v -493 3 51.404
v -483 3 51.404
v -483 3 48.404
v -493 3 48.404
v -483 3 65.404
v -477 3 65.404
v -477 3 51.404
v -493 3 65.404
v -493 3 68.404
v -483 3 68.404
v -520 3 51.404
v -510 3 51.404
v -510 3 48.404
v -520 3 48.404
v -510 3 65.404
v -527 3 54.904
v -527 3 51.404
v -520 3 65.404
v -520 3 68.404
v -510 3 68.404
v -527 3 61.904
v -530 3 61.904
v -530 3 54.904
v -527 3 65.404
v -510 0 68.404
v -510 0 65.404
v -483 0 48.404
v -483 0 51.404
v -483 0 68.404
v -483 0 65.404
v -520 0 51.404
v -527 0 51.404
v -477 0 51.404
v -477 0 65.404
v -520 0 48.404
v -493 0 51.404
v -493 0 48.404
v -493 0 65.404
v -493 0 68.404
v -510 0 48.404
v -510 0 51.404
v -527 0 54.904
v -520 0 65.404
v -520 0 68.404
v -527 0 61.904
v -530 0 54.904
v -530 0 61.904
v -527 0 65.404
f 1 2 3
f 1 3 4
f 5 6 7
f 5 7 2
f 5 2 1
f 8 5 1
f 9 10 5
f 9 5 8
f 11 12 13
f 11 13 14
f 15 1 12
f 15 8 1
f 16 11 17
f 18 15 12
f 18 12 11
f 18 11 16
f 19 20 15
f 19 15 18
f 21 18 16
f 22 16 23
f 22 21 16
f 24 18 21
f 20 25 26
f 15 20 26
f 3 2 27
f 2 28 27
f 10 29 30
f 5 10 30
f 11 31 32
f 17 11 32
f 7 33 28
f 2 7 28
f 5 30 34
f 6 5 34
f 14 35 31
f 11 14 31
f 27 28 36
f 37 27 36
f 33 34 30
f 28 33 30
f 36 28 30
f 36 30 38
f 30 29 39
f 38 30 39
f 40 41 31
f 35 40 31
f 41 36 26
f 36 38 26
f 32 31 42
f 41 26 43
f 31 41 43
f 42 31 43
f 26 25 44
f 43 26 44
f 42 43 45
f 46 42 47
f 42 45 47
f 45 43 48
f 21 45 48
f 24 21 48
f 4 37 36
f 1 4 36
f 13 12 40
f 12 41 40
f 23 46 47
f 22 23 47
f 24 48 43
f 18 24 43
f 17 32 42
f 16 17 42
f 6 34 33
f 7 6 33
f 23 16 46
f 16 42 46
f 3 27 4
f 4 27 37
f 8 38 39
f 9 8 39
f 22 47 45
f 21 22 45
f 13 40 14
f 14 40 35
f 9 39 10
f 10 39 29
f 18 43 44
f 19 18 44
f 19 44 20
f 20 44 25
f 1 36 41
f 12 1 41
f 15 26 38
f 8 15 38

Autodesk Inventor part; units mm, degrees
ref_plane "YZ Plane" through (0, 0, 0) normal (1, 0, 0) x (0, 1, 0)
ref_plane "XZ Plane" through (0, 0, 0) normal (0, 1, 0) x (-1, 0, 0)
ref_plane "XY Plane" through (0, 0, 0) normal (0, 0, 1) x (1, 0, 0)
sketch "Sketch2" plane through (0, 0, 0) normal (0, 1, 0) x (-1, 0, 0)
  line L0 (600, 68.7059) -> (634, 68.7059)
  arc A0 (642, 60.7059) -> (634, 68.7059) centre (634, 60.7059) ccw
  line L1 (642, 60.7059) -> (642, 56.7059)
  arc A1 (634, 48.7059) -> (642, 56.7059) centre (634, 56.7059) ccw
  line L2 (634, 48.7059) -> (632, 48.7059)
  arc A2 (632, 48.7059) -> (624, 40.7059) centre (632, 40.7059) ccw
  line L3 (624, 40.7059) -> (624, 36.7059)
  arc A3 (624, 36.7059) -> (632, 28.7059) centre (632, 36.7059) ccw
  line L4 (632, 28.7059) -> (634, 28.7059)
  arc A4 (642, 20.7059) -> (634, 28.7059) centre (634, 20.7059) ccw
  line L5 (642, 20.7059) -> (642, 16.7059)
  arc A5 (634, 8.7059) -> (642, 16.7059) centre (634, 16.7059) ccw
  line L6 (634, 8.7059) -> (600, 8.7059)
  arc A6 (592, 16.7059) -> (600, 8.7059) centre (600, 16.7059) ccw
  line L7 (592, 16.7059) -> (592, 21.7059)
  line L8 (592, 21.7059) -> (606.1716, 35.8774)
  arc A7 (606.1716, 35.8774) -> (606.1716, 41.5343) centre (603.3431, 38.7059) ccw
  line L9 (606.1716, -97.5343) -> (592, -111.7059)
  line L10 (592, -111.7059) -> (592, -116.7059)
  arc A8 (592, -116.7059) -> (600, -124.7059) centre (600, -116.7059) ccw
  line L11 (600, -124.7059) -> (634, -124.7059)
  arc A9 (634, -124.7059) -> (642, -116.7059) centre (634, -116.7059) ccw
  line L12 (642, -116.7059) -> (642, -112.7059)
  arc A10 (642, -112.7059) -> (634, -104.7059) centre (634, -112.7059) ccw
  line L13 (634, -104.7059) -> (632, -104.7059)
  arc A11 (624, -96.7059) -> (632, -104.7059) centre (632, -96.7059) ccw
  line L14 (624, -96.7059) -> (624, -92.7059)
  arc A12 (632, -84.7059) -> (624, -92.7059) centre (632, -92.7059) ccw
  line L15 (632, -84.7059) -> (634, -84.7059)
  arc A13 (634, -84.7059) -> (642, -76.7059) centre (634, -76.7059) ccw
  line L16 (642, -76.7059) -> (642, -72.7059)
  arc A14 (642, -72.7059) -> (634, -64.7059) centre (634, -72.7059) ccw
  line L17 (634, -64.7059) -> (600, -64.7059)
  arc A15 (600, -64.7059) -> (592, -72.7059) centre (600, -72.7059) ccw
  line L18 (592, -72.7059) -> (592, -77.7059)
  line L19 (592, -77.7059) -> (606.1716, -91.8774)
  arc A16 (606.1716, -97.5343) -> (606.1716, -91.8774) centre (603.3431, -94.7059) ccw
  circle A17 centre (618, -74.7059) radius 3
  circle A18 centre (634, -74.7059) radius 3
  circle A19 centre (634, -114.7059) radius 3
  circle A20 centre (618, -114.7059) radius 3
  circle A21 centre (618, 58.7059) radius 3
  circle A22 centre (634, 58.7059) radius 3
  circle A23 centre (634, 18.7059) radius 3
  circle A24 centre (618, 18.7059) radius 3
  line L20 (606.1716, 41.5343) -> (592, 55.7059)
  line L21 (592, 55.7059) -> (592, 60.7059)
  arc A25 (600, 68.7059) -> (592, 60.7059) centre (600, 60.7059) ccw
  line L22 (329, -137) -> (729, -137)
  line L23 (729, -137) -> (729, 83)
  line L24 (729, 83) -> (329, 83)
  line L25 (329, 83) -> (329, -137)
  line L26 (444, -107.4043) -> (417.5, -107.4043)
  line L27 (417.5, -107.4043) -> (417.5, -104.4043)
  line L28 (417.5, -104.4043) -> (450, -104.4043)
  line L29 (450, -104.4043) -> (450, -107.4043)
  line L30 (450, -107.4043) -> (444, -107.4043)
  line L31 (441, -117.9043) -> (444, -117.9043)
  line L32 (444, -117.9043) -> (444, -110.9043)
  line L33 (444, -110.9043) -> (441, -110.9043)
  line L34 (441, -110.9043) -> (441, -117.9043)
  line L35 (417.5, -121.4043) -> (417.5, -124.4043)
  line L36 (417.5, -124.4043) -> (450, -124.4043)
  line L37 (450, -124.4043) -> (450, -121.4043)
  line L38 (450, -121.4043) -> (417.5, -121.4043)
  line L39 (376.0002, -107.4043) -> (402.5, -107.4043)
  line L40 (402.5, -107.4043) -> (402.5, -104.4043)
  line L41 (402.5, -104.4043) -> (370, -104.4043)
  line L42 (370, -104.4043) -> (370, -107.4043)
  line L43 (370, -107.4043) -> (376.0002, -107.4043)
  line L44 (379.0002, -121.4043) -> (370, -121.4043)
  line L45 (370, -121.4043) -> (370, -124.4043)
  line L46 (370, -124.4043) -> (402.5, -124.4043)
  line L47 (402.5, -124.4043) -> (402.5, -121.4043)
  line L48 (402.5, -121.4043) -> (379.0002, -121.4043)
  line L49 (379.0002, -117.9043) -> (376.0002, -117.9043)
  line L50 (376.0002, -117.9043) -> (376.0002, -110.9043)
  line L51 (376.0002, -110.9043) -> (379.0002, -110.9043)
  line L52 (379.0002, -110.9043) -> (379.0002, -117.9043)
  line L53 (348, -127) -> (472.0002, -127)
  line L54 (472.0002, -127) -> (472.0002, -124.4043)
  line L55 (472.0002, -124.4043) -> (465, -124.4043)
  line L56 (465, -124.4043) -> (465, -121.4043)
  line L57 (465, -121.4043) -> (472.0002, -121.4043)
  line L58 (472.0002, -121.4043) -> (472.0002, -107.4043)
  line L59 (472.0002, -107.4043) -> (465, -107.4043)
  line L60 (465, -107.4043) -> (465, -104.4043)
  line L61 (465, -104.4043) -> (472.0002, -104.4043)
  line L62 (472.0002, -104.4043) -> (472.0002, -101)
  line L63 (472.0002, -101) -> (348, -101)
  line L64 (348, -101) -> (348, -104.4043)
  line L65 (348, -104.4043) -> (355, -104.4043)
  line L66 (355, -104.4043) -> (355, -107.4043)
  line L67 (355, -107.4043) -> (348, -107.4043)
  line L68 (348, -107.4043) -> (348, -121.4043)
  line L69 (348, -121.4043) -> (355, -121.4043)
  line L70 (355, -121.4043) -> (355, -124.4043)
  line L71 (355, -124.4043) -> (348, -124.4043)
  line L72 (348, -124.4043) -> (348, -127)
  circle A26 centre (447.7252, -37.7011) radius 3
  circle A27 centre (372.2748, -37.7011) radius 3
  circle A28 centre (410, -64.4043) radius 3
  circle A29 centre (448.5, -66.4043) radius 3
  circle A30 centre (371.5, -66.4043) radius 3
  circle A31 centre (410, -80.4043) radius 3
  line L73 (379, -84.4043) -> (376, -84.4043)
  line L74 (376, -84.4043) -> (376, -74.4043)
  line L75 (376, -74.4043) -> (379, -74.4043)
  line L76 (379, -74.4043) -> (379, -84.4043)
  line L77 (379, -57.4043) -> (376, -57.4043)
  line L78 (376, -57.4043) -> (376, -47.4043)
  line L79 (376, -47.4043) -> (379, -47.4043)
  line L80 (379, -47.4043) -> (379, -57.4043)
  line L81 (441, -47.4043) -> (441, -57.4043)
  line L82 (441, -57.4043) -> (444, -57.4043)
  line L83 (444, -57.4043) -> (444, -47.4043)
  line L84 (444, -47.4043) -> (441, -47.4043)
  line L85 (441, -74.4043) -> (441, -84.4043)
  line L86 (441, -84.4043) -> (444, -84.4043)
  line L87 (444, -84.4043) -> (444, -74.4043)
  line L88 (444, -74.4043) -> (441, -74.4043)
  line L89 (427, -44.4043) -> (427, -72.4043)
  arc A32 (427, -72.4043) -> (433, -72.4043) centre (430, -72.4043) ccw
  line L90 (433, -72.4043) -> (433, -44.4043)
  arc A33 (433, -44.4043) -> (427, -44.4043) centre (430, -44.4043) ccw
  arc A34 (387, -72.4043) -> (393, -72.4043) centre (390, -72.4043) ccw
  line L91 (393, -72.4043) -> (393, -44.4043)
  arc A35 (393, -44.4043) -> (387, -44.4043) centre (390, -44.4043) ccw
  line L92 (387, -44.4043) -> (387, -72.4043)
  line L93 (372.3983, -27.7019) -> (383.2576, -27.7018)
  arc A36 (390.8984, -33.3311) -> (383.2576, -27.7018) centre (383.2577, -35.7018) ccw
  arc A37 (390.8984, -33.3311) -> (429.1018, -33.3307) centre (410, -27.4043) ccw
  arc A38 (436.7424, -27.7012) -> (429.1018, -33.3307) centre (436.7425, -35.7012) ccw
  line L94 (436.7424, -27.7012) -> (447.7251, -27.7011)
  arc A39 (457.0715, -34.1449) -> (447.7251, -27.7011) centre (447.7252, -37.7011) ccw
  line L95 (457.0715, -34.1449) -> (477.9368, -88.9818)
  arc A40 (474.1982, -94.4043) -> (477.9368, -88.9818) centre (474.1982, -90.4043) ccw
  line L96 (474.1982, -94.4043) -> (465, -94.4043)
  line L97 (465, -94.4043) -> (465, -91.4043)
  line L98 (465, -91.4043) -> (450, -91.4043)
  line L99 (450, -91.4043) -> (450, -94.4043)
  line L100 (450, -94.4043) -> (417.5, -94.4043)
  line L101 (417.5, -94.4043) -> (417.5, -91.4043)
  line L102 (417.5, -91.4043) -> (402.5, -91.4043)
  line L103 (402.5, -91.4043) -> (402.5, -94.4043)
  line L104 (402.5, -94.4043) -> (370, -94.4043)
  line L105 (370, -94.4043) -> (370, -91.4043)
  line L106 (370, -91.4043) -> (355, -91.4043)
  line L107 (355, -91.4043) -> (355, -94.4043)
  line L108 (355, -94.4043) -> (345.8018, -94.4043)
  arc A41 (342.0632, -88.9818) -> (345.8018, -94.4043) centre (345.8018, -90.4043) ccw
  line L109 (342.0632, -88.9818) -> (362.9285, -34.1449)
  arc A42 (372.3983, -27.7019) -> (362.9285, -34.1449) centre (372.2748, -37.7011) ccw
  line L110 (491.3983, -95.7004) -> (502.2576, -95.7005)
  arc A43 (502.2576, -95.7005) -> (509.8984, -90.0712) centre (502.2577, -87.7005) ccw
  arc A44 (548.1018, -90.0716) -> (509.8984, -90.0712) centre (529, -95.998) ccw
  arc A45 (548.1018, -90.0716) -> (555.7424, -95.701) centre (555.7425, -87.701) ccw
  line L111 (555.7424, -95.701) -> (566.7251, -95.7011)
  arc A46 (566.7251, -95.7011) -> (576.0715, -89.2574) centre (566.7252, -85.7011) ccw
  line L112 (576.0715, -89.2574) -> (596.9368, -34.4205)
  arc A47 (596.9368, -34.4205) -> (593.1982, -28.998) centre (593.1982, -32.998) ccw
  line L113 (593.1982, -28.998) -> (584, -28.998)
  line L114 (584, -28.998) -> (584, -31.998)
  line L115 (584, -31.998) -> (569, -31.998)
  line L116 (569, -31.998) -> (569, -28.998)
  line L117 (569, -28.998) -> (536.5, -28.998)
  line L118 (536.5, -28.998) -> (536.5, -31.998)
  line L119 (536.5, -31.998) -> (521.5, -31.998)
  line L120 (521.5, -31.998) -> (521.5, -28.998)
  line L121 (521.5, -28.998) -> (489, -28.998)
  line L122 (489, -28.998) -> (489, -31.998)
  line L123 (489, -31.998) -> (474, -31.998)
  line L124 (474, -31.998) -> (474, -28.998)
  line L125 (474, -28.998) -> (464.8018, -28.998)
  arc A48 (464.8018, -28.998) -> (461.0632, -34.4205) centre (464.8018, -32.998) ccw
  line L126 (461.0632, -34.4205) -> (481.9285, -89.2574)
  arc A49 (481.9285, -89.2574) -> (491.3983, -95.7004) centre (491.2748, -85.7011) ccw
  arc A50 (512, -50.998) -> (506, -50.998) centre (509, -50.998) ccw
  line L127 (512, -50.998) -> (512, -78.998)
  arc A51 (506, -78.998) -> (512, -78.998) centre (509, -78.998) ccw
  line L128 (506, -78.998) -> (506, -50.998)
  line L129 (546, -78.998) -> (546, -50.998)
  arc A52 (552, -50.998) -> (546, -50.998) centre (549, -50.998) ccw
  line L130 (552, -50.998) -> (552, -78.998)
  arc A53 (546, -78.998) -> (552, -78.998) centre (549, -78.998) ccw
  line L131 (560, -48.998) -> (560, -38.998)
  line L132 (560, -38.998) -> (563, -38.998)
  line L133 (563, -38.998) -> (563, -48.998)
  line L134 (563, -48.998) -> (560, -48.998)
  line L135 (560, -75.998) -> (560, -65.998)
  line L136 (560, -65.998) -> (563, -65.998)
  line L137 (563, -65.998) -> (563, -75.998)
  line L138 (563, -75.998) -> (560, -75.998)
  line L139 (498, -65.998) -> (495, -65.998)
  line L140 (495, -65.998) -> (495, -75.998)
  line L141 (495, -75.998) -> (498, -75.998)
  line L142 (498, -75.998) -> (498, -65.998)
  line L143 (498, -38.998) -> (495, -38.998)
  line L144 (495, -38.998) -> (495, -48.998)
  line L145 (495, -48.998) -> (498, -48.998)
  line L146 (498, -48.998) -> (498, -38.998)
  circle A54 centre (529, -42.998) radius 3
  circle A55 centre (490.5, -56.998) radius 3
  circle A56 centre (567.5, -56.998) radius 3
  circle A57 centre (529, -58.998) radius 3
  circle A58 centre (491.2748, -85.7011) radius 3
  circle A59 centre (566.7252, -85.7011) radius 3
  circle A60 centre (462, -114.4043) radius 3
  circle A61 centre (358.0002, -114.4043) radius 3
  line L147 (578, -104.4043) -> (578, -107.4043)
  line L148 (578, -107.4043) -> (585, -107.4043)
  line L149 (585, -107.4043) -> (585, -110.9043)
  line L150 (585, -110.9043) -> (588, -110.9043)
  line L151 (588, -110.9043) -> (588, -117.9043)
  line L152 (588, -117.9043) -> (585, -117.9043)
  line L153 (585, -117.9043) -> (585, -121.4043)
  line L154 (585, -121.4043) -> (578, -121.4043)
  line L155 (578, -121.4043) -> (578, -124.4043)
  line L156 (578, -124.4043) -> (568, -124.4043)
  line L157 (568, -124.4043) -> (568, -121.4043)
  line L158 (568, -121.4043) -> (551, -121.4043)
  line L159 (551, -121.4043) -> (551, -124.4043)
  line L160 (551, -124.4043) -> (541, -124.4043)
  line L161 (541, -124.4043) -> (541, -121.4043)
  line L162 (541, -121.4043) -> (535, -121.4043)
  line L163 (535, -121.4043) -> (535, -107.4043)
  line L164 (535, -107.4043) -> (541, -107.4043)
  line L165 (541, -107.4043) -> (541, -104.4043)
  line L166 (541, -104.4043) -> (551, -104.4043)
  line L167 (551, -104.4043) -> (551, -107.4043)
  line L168 (551, -107.4043) -> (568, -107.4043)
  line L169 (568, -107.4043) -> (568, -104.4043)
  line L170 (568, -104.4043) -> (578, -104.4043)
  line L171 (520, -104.4043) -> (520, -107.4043)
  line L172 (520, -107.4043) -> (527, -107.4043)
  line L173 (527, -107.4043) -> (527, -110.9043)
  line L174 (527, -110.9043) -> (530, -110.9043)
  line L175 (530, -110.9043) -> (530, -117.9043)
  line L176 (530, -117.9043) -> (527, -117.9043)
  line L177 (527, -117.9043) -> (527, -121.4043)
  line L178 (527, -121.4043) -> (520, -121.4043)
  line L179 (520, -121.4043) -> (520, -124.4043)
  line L180 (520, -124.4043) -> (510, -124.4043)
  line L181 (510, -124.4043) -> (510, -121.4043)
  line L182 (510, -121.4043) -> (493, -121.4043)
  line L183 (493, -121.4043) -> (493, -124.4043)
  line L184 (493, -124.4043) -> (483, -124.4043)
  line L185 (483, -124.4043) -> (483, -121.4043)
  line L186 (483, -121.4043) -> (477, -121.4043)
  line L187 (477, -121.4043) -> (477, -107.4043)
  line L188 (477, -107.4043) -> (483, -107.4043)
  line L189 (483, -107.4043) -> (483, -104.4043)
  line L190 (483, -104.4043) -> (493, -104.4043)
  line L191 (493, -104.4043) -> (493, -107.4043)
  line L192 (493, -107.4043) -> (510, -107.4043)
  line L193 (510, -107.4043) -> (510, -104.4043)
  line L194 (510, -104.4043) -> (520, -104.4043)
  line L195 (520, 48.4043) -> (520, 51.4043)
  line L196 (520, 51.4043) -> (527, 51.4043)
  line L197 (527, 51.4043) -> (527, 54.9043)
  line L198 (527, 54.9043) -> (530, 54.9043)
  line L199 (530, 54.9043) -> (530, 61.9043)
  line L200 (530, 61.9043) -> (527, 61.9043)
  line L201 (527, 61.9043) -> (527, 65.4043)
  line L202 (527, 65.4043) -> (520, 65.4043)
  line L203 (520, 65.4043) -> (520, 68.4043)
  line L204 (520, 68.4043) -> (510, 68.4043)
  line L205 (510, 68.4043) -> (510, 65.4043)
  line L206 (510, 65.4043) -> (493, 65.4043)
  line L207 (493, 65.4043) -> (493, 68.4043)
  line L208 (493, 68.4043) -> (483, 68.4043)
  line L209 (483, 68.4043) -> (483, 65.4043)
  line L210 (483, 65.4043) -> (477, 65.4043)
  line L211 (477, 65.4043) -> (477, 51.4043)
  line L212 (477, 51.4043) -> (483, 51.4043)
  line L213 (483, 51.4043) -> (483, 48.4043)
  line L214 (483, 48.4043) -> (493, 48.4043)
  line L215 (493, 48.4043) -> (493, 51.4043)
  line L216 (493, 51.4043) -> (510, 51.4043)
  line L217 (510, 51.4043) -> (510, 48.4043)
  line L218 (510, 48.4043) -> (520, 48.4043)
  line L219 (578, 48.4043) -> (578, 51.4043)
  line L220 (578, 51.4043) -> (585, 51.4043)
  line L221 (585, 51.4043) -> (585, 54.9043)
  line L222 (585, 54.9043) -> (588, 54.9043)
  line L223 (588, 54.9043) -> (588, 61.9043)
  line L224 (588, 61.9043) -> (585, 61.9043)
  line L225 (585, 61.9043) -> (585, 65.4043)
  line L226 (585, 65.4043) -> (578, 65.4043)
  line L227 (578, 65.4043) -> (578, 68.4043)
  line L228 (578, 68.4043) -> (568, 68.4043)
  line L229 (568, 68.4043) -> (568, 65.4043)
  line L230 (568, 65.4043) -> (551, 65.4043)
  line L231 (551, 65.4043) -> (551, 68.4043)
  line L232 (551, 68.4043) -> (541, 68.4043)
  line L233 (541, 68.4043) -> (541, 65.4043)
  line L234 (541, 65.4043) -> (535, 65.4043)
  line L235 (535, 65.4043) -> (535, 51.4043)
  line L236 (535, 51.4043) -> (541, 51.4043)
  line L237 (541, 51.4043) -> (541, 48.4043)
  line L238 (541, 48.4043) -> (551, 48.4043)
  line L239 (551, 48.4043) -> (551, 51.4043)
  line L240 (551, 51.4043) -> (568, 51.4043)
  line L241 (568, 51.4043) -> (568, 48.4043)
  line L242 (568, 48.4043) -> (578, 48.4043)
  circle A62 centre (358.0002, 58.4043) radius 3
  circle A63 centre (462, 58.4043) radius 3
  circle A64 centre (566.7252, 29.7011) radius 3
  circle A65 centre (491.2748, 29.7011) radius 3
  circle A66 centre (529, 2.998) radius 3
  circle A67 centre (567.5, 0.998) radius 3
  circle A68 centre (490.5, 0.998) radius 3
  circle A69 centre (529, -13.002) radius 3
  line L243 (498, -17.002) -> (495, -17.002)
  line L244 (495, -17.002) -> (495, -7.002)
  line L245 (495, -7.002) -> (498, -7.002)
  line L246 (498, -7.002) -> (498, -17.002)
  line L247 (498, 9.998) -> (495, 9.998)
  line L248 (495, 9.998) -> (495, 19.998)
  line L249 (495, 19.998) -> (498, 19.998)
  line L250 (498, 19.998) -> (498, 9.998)
  line L251 (560, 19.998) -> (560, 9.998)
  line L252 (560, 9.998) -> (563, 9.998)
  line L253 (563, 9.998) -> (563, 19.998)
  line L254 (563, 19.998) -> (560, 19.998)
  line L255 (560, -7.002) -> (560, -17.002)
  line L256 (560, -17.002) -> (563, -17.002)
  line L257 (563, -17.002) -> (563, -7.002)
  line L258 (563, -7.002) -> (560, -7.002)
  line L259 (546, 22.998) -> (546, -5.002)
  arc A70 (546, -5.002) -> (552, -5.002) centre (549, -5.002) ccw
  line L260 (552, -5.002) -> (552, 22.998)
  arc A71 (552, 22.998) -> (546, 22.998) centre (549, 22.998) ccw
  arc A72 (506, -5.002) -> (512, -5.002) centre (509, -5.002) ccw
  line L261 (512, -5.002) -> (512, 22.998)
  arc A73 (512, 22.998) -> (506, 22.998) centre (509, 22.998) ccw
  line L262 (506, 22.998) -> (506, -5.002)
  line L263 (491.3983, 39.7004) -> (502.2576, 39.7005)
  arc A74 (509.8984, 34.0712) -> (502.2576, 39.7005) centre (502.2577, 31.7005) ccw
  arc A75 (509.8984, 34.0712) -> (548.1018, 34.0716) centre (529, 39.998) ccw
  arc A76 (555.7424, 39.701) -> (548.1018, 34.0716) centre (555.7425, 31.701) ccw
  line L264 (555.7424, 39.701) -> (566.7251, 39.7011)
  arc A77 (576.0715, 33.2574) -> (566.7251, 39.7011) centre (566.7252, 29.7011) ccw
  line L265 (576.0715, 33.2574) -> (596.9368, -21.5795)
  arc A78 (593.1982, -27.002) -> (596.9368, -21.5795) centre (593.1982, -23.002) ccw
  line L266 (593.1982, -27.002) -> (584, -27.002)
  line L267 (584, -27.002) -> (584, -24.002)
  line L268 (584, -24.002) -> (569, -24.002)
  line L269 (569, -24.002) -> (569, -27.002)
  line L270 (569, -27.002) -> (536.5, -27.002)
  line L271 (536.5, -27.002) -> (536.5, -24.002)
  line L272 (536.5, -24.002) -> (521.5, -24.002)
  line L273 (521.5, -24.002) -> (521.5, -27.002)
  line L274 (521.5, -27.002) -> (489, -27.002)
  line L275 (489, -27.002) -> (489, -24.002)
  line L276 (489, -24.002) -> (474, -24.002)
  line L277 (474, -24.002) -> (474, -27.002)
  line L278 (474, -27.002) -> (464.8018, -27.002)
  arc A79 (461.0632, -21.5795) -> (464.8018, -27.002) centre (464.8018, -23.002) ccw
  line L279 (461.0632, -21.5795) -> (481.9285, 33.2574)
  arc A80 (491.3983, 39.7004) -> (481.9285, 33.2574) centre (491.2748, 29.7011) ccw
  line L280 (372.3983, -28.2981) -> (383.2576, -28.2982)
  arc A81 (383.2576, -28.2982) -> (390.8984, -22.6689) centre (383.2577, -20.2982) ccw
  arc A82 (429.1018, -22.6693) -> (390.8984, -22.6689) centre (410, -28.5957) ccw
  arc A83 (429.1018, -22.6693) -> (436.7424, -28.2988) centre (436.7425, -20.2988) ccw
  line L281 (436.7424, -28.2988) -> (447.7251, -28.2989)
  arc A84 (447.7251, -28.2989) -> (457.0715, -21.8551) centre (447.7252, -18.2989) ccw
  line L282 (457.0715, -21.8551) -> (477.9368, 32.9818)
  arc A85 (477.9368, 32.9818) -> (474.1982, 38.4043) centre (474.1982, 34.4043) ccw
  line L283 (474.1982, 38.4043) -> (465, 38.4043)
  line L284 (465, 38.4043) -> (465, 35.4043)
  line L285 (465, 35.4043) -> (450, 35.4043)
  line L286 (450, 35.4043) -> (450, 38.4043)
  line L287 (450, 38.4043) -> (417.5, 38.4043)
  line L288 (417.5, 38.4043) -> (417.5, 35.4043)
  line L289 (417.5, 35.4043) -> (402.5, 35.4043)
  line L290 (402.5, 35.4043) -> (402.5, 38.4043)
  line L291 (402.5, 38.4043) -> (370, 38.4043)
  line L292 (370, 38.4043) -> (370, 35.4043)
  line L293 (370, 35.4043) -> (355, 35.4043)
  line L294 (355, 35.4043) -> (355, 38.4043)
  line L295 (355, 38.4043) -> (345.8018, 38.4043)
  arc A86 (345.8018, 38.4043) -> (342.0632, 32.9818) centre (345.8018, 34.4043) ccw
  line L296 (342.0632, 32.9818) -> (362.9285, -21.8551)
  arc A87 (362.9285, -21.8551) -> (372.3983, -28.2981) centre (372.2748, -18.2989) ccw
  arc A88 (393, 16.4043) -> (387, 16.4043) centre (390, 16.4043) ccw
  line L297 (393, 16.4043) -> (393, -11.5957)
  arc A89 (387, -11.5957) -> (393, -11.5957) centre (390, -11.5957) ccw
  line L298 (387, -11.5957) -> (387, 16.4043)
  line L299 (427, -11.5957) -> (427, 16.4043)
  arc A90 (433, 16.4043) -> (427, 16.4043) centre (430, 16.4043) ccw
  line L300 (433, 16.4043) -> (433, -11.5957)
  arc A91 (427, -11.5957) -> (433, -11.5957) centre (430, -11.5957) ccw
  line L301 (441, 18.4043) -> (441, 28.4043)
  line L302 (441, 28.4043) -> (444, 28.4043)
  line L303 (444, 28.4043) -> (444, 18.4043)
  line L304 (444, 18.4043) -> (441, 18.4043)
  line L305 (441, -8.5957) -> (441, 1.4043)
  line L306 (441, 1.4043) -> (444, 1.4043)
  line L307 (444, 1.4043) -> (444, -8.5957)
  line L308 (444, -8.5957) -> (441, -8.5957)
  line L309 (379, 1.4043) -> (376, 1.4043)
  line L310 (376, 1.4043) -> (376, -8.5957)
  line L311 (376, -8.5957) -> (379, -8.5957)
  line L312 (379, -8.5957) -> (379, 1.4043)
  line L313 (379, 28.4043) -> (376, 28.4043)
  line L314 (376, 28.4043) -> (376, 18.4043)
  line L315 (376, 18.4043) -> (379, 18.4043)
  line L316 (379, 18.4043) -> (379, 28.4043)
  circle A92 centre (410, 24.4043) radius 3
  circle A93 centre (371.5, 10.4043) radius 3
  circle A94 centre (448.5, 10.4043) radius 3
  circle A95 centre (410, 8.4043) radius 3
  circle A96 centre (372.2748, -18.2989) radius 3
  circle A97 centre (447.7252, -18.2989) radius 3
  line L317 (348, 71) -> (472.0002, 71)
  line L318 (472.0002, 71) -> (472.0002, 68.4043)
  line L319 (472.0002, 68.4043) -> (465, 68.4043)
  line L320 (465, 68.4043) -> (465, 65.4043)
  line L321 (465, 65.4043) -> (472.0002, 65.4043)
  line L322 (472.0002, 65.4043) -> (472.0002, 51.4043)
  line L323 (472.0002, 51.4043) -> (465, 51.4043)
  line L324 (465, 51.4043) -> (465, 48.4043)
  line L325 (465, 48.4043) -> (472.0002, 48.4043)
  line L326 (472.0002, 48.4043) -> (472.0002, 45)
  line L327 (472.0002, 45) -> (348, 45)
  line L328 (348, 45) -> (348, 48.4043)
  line L329 (348, 48.4043) -> (355, 48.4043)
  line L330 (355, 48.4043) -> (355, 51.4043)
  line L331 (355, 51.4043) -> (348, 51.4043)
  line L332 (348, 51.4043) -> (348, 65.4043)
  line L333 (348, 65.4043) -> (355, 65.4043)
  line L334 (355, 65.4043) -> (355, 68.4043)
  line L335 (355, 68.4043) -> (348, 68.4043)
  line L336 (348, 68.4043) -> (348, 71)
  line L337 (379.0002, 61.9043) -> (376.0002, 61.9043)
  line L338 (376.0002, 61.9043) -> (376.0002, 54.9043)
  line L339 (376.0002, 54.9043) -> (379.0002, 54.9043)
  line L340 (379.0002, 54.9043) -> (379.0002, 61.9043)
  line L341 (379.0002, 65.4043) -> (370, 65.4043)
  line L342 (370, 65.4043) -> (370, 68.4043)
  line L343 (370, 68.4043) -> (402.5, 68.4043)
  line L344 (402.5, 68.4043) -> (402.5, 65.4043)
  line L345 (402.5, 65.4043) -> (379.0002, 65.4043)
  line L346 (376.0002, 51.4043) -> (402.5, 51.4043)
  line L347 (402.5, 51.4043) -> (402.5, 48.4043)
  line L348 (402.5, 48.4043) -> (370, 48.4043)
  line L349 (370, 48.4043) -> (370, 51.4043)
  line L350 (370, 51.4043) -> (376.0002, 51.4043)
  line L351 (417.5, 65.4043) -> (417.5, 68.4043)
  line L352 (417.5, 68.4043) -> (450, 68.4043)
  line L353 (450, 68.4043) -> (450, 65.4043)
  line L354 (450, 65.4043) -> (417.5, 65.4043)
  line L355 (441, 61.9043) -> (444, 61.9043)
  line L356 (444, 61.9043) -> (444, 54.9043)
  line L357 (444, 54.9043) -> (441, 54.9043)
  line L358 (441, 54.9043) -> (441, 61.9043)
  line L359 (444, 51.4043) -> (417.5, 51.4043)
  line L360 (417.5, 51.4043) -> (417.5, 48.4043)
  line L361 (417.5, 48.4043) -> (450, 48.4043)
  line L362 (450, 48.4043) -> (450, 51.4043)
  line L363 (450, 51.4043) -> (444, 51.4043)
  line L364 (672, -101.5) -> (672, -103)
  line L365 (672, -103) -> (695, -103)
  line L366 (695, -103) -> (695, -107.1363)
  arc A98 (692.2891, -110.9229) -> (695, -107.1363) centre (691, -107.1363) ccw
  line L367 (692.2891, -110.9229) -> (650.6445, -125.0997)
  arc A99 (648, -123.2064) -> (650.6445, -125.0997) centre (650, -123.2064) ccw
  line L368 (648, -123.2064) -> (648, -115)
  line L369 (648, -115) -> (649, -115)
  arc A100 (649, -115) -> (651, -113) centre (649, -113) ccw
  line L370 (651, -113) -> (651, -90)
  arc A101 (651, -90) -> (649, -88) centre (649, -90) ccw
  line L371 (649, -88) -> (648, -88)
  line L372 (648, -88) -> (648, -79.7936)
  arc A102 (650.6445, -77.9003) -> (648, -79.7936) centre (650, -79.7936) ccw
  line L373 (650.6445, -77.9003) -> (692.2891, -92.0771)
  arc A103 (695, -95.8637) -> (692.2891, -92.0771) centre (691, -95.8637) ccw
  line L374 (695, -95.8637) -> (695, -100)
  line L375 (695, -100) -> (672, -100)
  line L376 (672, -100) -> (672, -101.5)
  line L377 (671, 47.5) -> (671, 46)
  line L378 (671, 46) -> (694, 46)
  line L379 (694, 46) -> (694, 41.8637)
  arc A104 (691.2891, 38.0771) -> (694, 41.8637) centre (690, 41.8637) ccw
  line L380 (691.2891, 38.0771) -> (649.6445, 23.9003)
  arc A105 (647, 25.7936) -> (649.6445, 23.9003) centre (649, 25.7936) ccw
  line L381 (647, 25.7936) -> (647, 34)
  line L382 (647, 34) -> (648, 34)
  arc A106 (648, 34) -> (650, 36) centre (648, 36) ccw
  line L383 (650, 36) -> (650, 59)
  arc A107 (650, 59) -> (648, 61) centre (648, 59) ccw
  line L384 (648, 61) -> (647, 61)
  line L385 (647, 61) -> (647, 69.2064)
  arc A108 (649.6445, 71.0997) -> (647, 69.2064) centre (649, 69.2064) ccw
  line L386 (649.6445, 71.0997) -> (691.2891, 56.9229)
  arc A109 (694, 53.1363) -> (691.2891, 56.9229) centre (690, 53.1363) ccw
  line L387 (694, 53.1363) -> (694, 49)
  line L388 (694, 49) -> (671, 49)
  line L389 (671, 49) -> (671, 47.5)
  line L390 (692.5332, 13) -> (713, 13)
  line L391 (713, 13) -> (713, 28)
  line L392 (713, 28) -> (716, 28)
  line L393 (716, 28) -> (716, 37.1982)
  arc A110 (716, 37.1982) -> (710.5775, 40.9368) centre (712, 37.1982) ccw
  line L394 (710.5775, 40.9368) -> (655.7406, 20.0715)
  arc A111 (655.7406, 20.0715) -> (649.7575, 13.7252) centre (659.2969, 10.7252) ccw
  line L395 (649.7575, 13.7252) -> (659.2969, 13.7252)
  arc A112 (659.2969, 7.7252) -> (659.2969, 13.7252) centre (659.2969, 10.7252) ccw
  line L396 (659.2969, 7.7252) -> (649.2969, 7.7252)
  line L397 (649.2969, 7.7252) -> (649.2963, 1.7997)
  arc A113 (677.6446, -24) -> (649.2963, 1.7997) centre (649, -27) ccw
  line L398 (677.6446, -24) -> (686, -24)
  arc A114 (686.0452, -29.9997) -> (686, -24) centre (686, -27) ccw
  line L399 (686.0452, -29.9997) -> (677.6446, -29.9997)
  arc A115 (649.2975, -55.7997) -> (677.6446, -29.9997) centre (649, -27) ccw
  line L400 (649.2975, -55.7997) -> (649.2976, -61.7252)
  line L401 (649.2976, -61.7252) -> (659.2969, -61.7252)
  arc A116 (659.2969, -67.7252) -> (659.2969, -61.7252) centre (659.2969, -64.7252) ccw
  line L402 (659.2969, -67.7252) -> (649.7575, -67.7252)
  arc A117 (649.7575, -67.7252) -> (655.7406, -74.0715) centre (659.2969, -64.7252) ccw
  line L403 (655.7406, -74.0715) -> (710.5775, -94.9368)
  arc A118 (710.5775, -94.9368) -> (716, -91.1982) centre (712, -91.1982) ccw
  line L404 (716, -91.1982) -> (716, -82)
  line L405 (716, -82) -> (713, -82)
  line L406 (713, -82) -> (713, -67)
  line L407 (713, -67) -> (692.5332, -67)
  line L408 (692.5332, -67) -> (692.5332, -64)
  line L409 (692.5332, -64) -> (716, -64)
  line L410 (716, -64) -> (716, -34.5)
  line L411 (716, -34.5) -> (713, -34.5)
  line L412 (713, -34.5) -> (713, -19.5)
  line L413 (713, -19.5) -> (716, -19.5)
  line L414 (716, -19.5) -> (716, 10)
  line L415 (716, 10) -> (692.5332, 10)
  line L416 (692.5332, 10) -> (692.5332, 13)
  point P0 (0, 0)
  point P1 (461.0632, -21.5795)
  point P2 (593.1982, -27.002)
  point P3 (576.0715, 33.2574)
  point P4 (548.1018, 34.0716)
  point P5 (509.8984, 34.0712)
  point P6 (481.9285, 33.2574)
  point P7 (506, -5.002)
  point P8 (506, 22.998)
  point P9 (512, -5.002)
  point P10 (552, -5.002)
extrude "Extrusion2" add sketch "Sketch2" along normal blind 3 contours L218 L217 L216 L215 L214 L213 L212 L211 L210 L209 L208 L207 L206 L205 L204 L203 L202 L201 L200 L199 L198 L197 L196 L195
properties part number "soporte_medio"
